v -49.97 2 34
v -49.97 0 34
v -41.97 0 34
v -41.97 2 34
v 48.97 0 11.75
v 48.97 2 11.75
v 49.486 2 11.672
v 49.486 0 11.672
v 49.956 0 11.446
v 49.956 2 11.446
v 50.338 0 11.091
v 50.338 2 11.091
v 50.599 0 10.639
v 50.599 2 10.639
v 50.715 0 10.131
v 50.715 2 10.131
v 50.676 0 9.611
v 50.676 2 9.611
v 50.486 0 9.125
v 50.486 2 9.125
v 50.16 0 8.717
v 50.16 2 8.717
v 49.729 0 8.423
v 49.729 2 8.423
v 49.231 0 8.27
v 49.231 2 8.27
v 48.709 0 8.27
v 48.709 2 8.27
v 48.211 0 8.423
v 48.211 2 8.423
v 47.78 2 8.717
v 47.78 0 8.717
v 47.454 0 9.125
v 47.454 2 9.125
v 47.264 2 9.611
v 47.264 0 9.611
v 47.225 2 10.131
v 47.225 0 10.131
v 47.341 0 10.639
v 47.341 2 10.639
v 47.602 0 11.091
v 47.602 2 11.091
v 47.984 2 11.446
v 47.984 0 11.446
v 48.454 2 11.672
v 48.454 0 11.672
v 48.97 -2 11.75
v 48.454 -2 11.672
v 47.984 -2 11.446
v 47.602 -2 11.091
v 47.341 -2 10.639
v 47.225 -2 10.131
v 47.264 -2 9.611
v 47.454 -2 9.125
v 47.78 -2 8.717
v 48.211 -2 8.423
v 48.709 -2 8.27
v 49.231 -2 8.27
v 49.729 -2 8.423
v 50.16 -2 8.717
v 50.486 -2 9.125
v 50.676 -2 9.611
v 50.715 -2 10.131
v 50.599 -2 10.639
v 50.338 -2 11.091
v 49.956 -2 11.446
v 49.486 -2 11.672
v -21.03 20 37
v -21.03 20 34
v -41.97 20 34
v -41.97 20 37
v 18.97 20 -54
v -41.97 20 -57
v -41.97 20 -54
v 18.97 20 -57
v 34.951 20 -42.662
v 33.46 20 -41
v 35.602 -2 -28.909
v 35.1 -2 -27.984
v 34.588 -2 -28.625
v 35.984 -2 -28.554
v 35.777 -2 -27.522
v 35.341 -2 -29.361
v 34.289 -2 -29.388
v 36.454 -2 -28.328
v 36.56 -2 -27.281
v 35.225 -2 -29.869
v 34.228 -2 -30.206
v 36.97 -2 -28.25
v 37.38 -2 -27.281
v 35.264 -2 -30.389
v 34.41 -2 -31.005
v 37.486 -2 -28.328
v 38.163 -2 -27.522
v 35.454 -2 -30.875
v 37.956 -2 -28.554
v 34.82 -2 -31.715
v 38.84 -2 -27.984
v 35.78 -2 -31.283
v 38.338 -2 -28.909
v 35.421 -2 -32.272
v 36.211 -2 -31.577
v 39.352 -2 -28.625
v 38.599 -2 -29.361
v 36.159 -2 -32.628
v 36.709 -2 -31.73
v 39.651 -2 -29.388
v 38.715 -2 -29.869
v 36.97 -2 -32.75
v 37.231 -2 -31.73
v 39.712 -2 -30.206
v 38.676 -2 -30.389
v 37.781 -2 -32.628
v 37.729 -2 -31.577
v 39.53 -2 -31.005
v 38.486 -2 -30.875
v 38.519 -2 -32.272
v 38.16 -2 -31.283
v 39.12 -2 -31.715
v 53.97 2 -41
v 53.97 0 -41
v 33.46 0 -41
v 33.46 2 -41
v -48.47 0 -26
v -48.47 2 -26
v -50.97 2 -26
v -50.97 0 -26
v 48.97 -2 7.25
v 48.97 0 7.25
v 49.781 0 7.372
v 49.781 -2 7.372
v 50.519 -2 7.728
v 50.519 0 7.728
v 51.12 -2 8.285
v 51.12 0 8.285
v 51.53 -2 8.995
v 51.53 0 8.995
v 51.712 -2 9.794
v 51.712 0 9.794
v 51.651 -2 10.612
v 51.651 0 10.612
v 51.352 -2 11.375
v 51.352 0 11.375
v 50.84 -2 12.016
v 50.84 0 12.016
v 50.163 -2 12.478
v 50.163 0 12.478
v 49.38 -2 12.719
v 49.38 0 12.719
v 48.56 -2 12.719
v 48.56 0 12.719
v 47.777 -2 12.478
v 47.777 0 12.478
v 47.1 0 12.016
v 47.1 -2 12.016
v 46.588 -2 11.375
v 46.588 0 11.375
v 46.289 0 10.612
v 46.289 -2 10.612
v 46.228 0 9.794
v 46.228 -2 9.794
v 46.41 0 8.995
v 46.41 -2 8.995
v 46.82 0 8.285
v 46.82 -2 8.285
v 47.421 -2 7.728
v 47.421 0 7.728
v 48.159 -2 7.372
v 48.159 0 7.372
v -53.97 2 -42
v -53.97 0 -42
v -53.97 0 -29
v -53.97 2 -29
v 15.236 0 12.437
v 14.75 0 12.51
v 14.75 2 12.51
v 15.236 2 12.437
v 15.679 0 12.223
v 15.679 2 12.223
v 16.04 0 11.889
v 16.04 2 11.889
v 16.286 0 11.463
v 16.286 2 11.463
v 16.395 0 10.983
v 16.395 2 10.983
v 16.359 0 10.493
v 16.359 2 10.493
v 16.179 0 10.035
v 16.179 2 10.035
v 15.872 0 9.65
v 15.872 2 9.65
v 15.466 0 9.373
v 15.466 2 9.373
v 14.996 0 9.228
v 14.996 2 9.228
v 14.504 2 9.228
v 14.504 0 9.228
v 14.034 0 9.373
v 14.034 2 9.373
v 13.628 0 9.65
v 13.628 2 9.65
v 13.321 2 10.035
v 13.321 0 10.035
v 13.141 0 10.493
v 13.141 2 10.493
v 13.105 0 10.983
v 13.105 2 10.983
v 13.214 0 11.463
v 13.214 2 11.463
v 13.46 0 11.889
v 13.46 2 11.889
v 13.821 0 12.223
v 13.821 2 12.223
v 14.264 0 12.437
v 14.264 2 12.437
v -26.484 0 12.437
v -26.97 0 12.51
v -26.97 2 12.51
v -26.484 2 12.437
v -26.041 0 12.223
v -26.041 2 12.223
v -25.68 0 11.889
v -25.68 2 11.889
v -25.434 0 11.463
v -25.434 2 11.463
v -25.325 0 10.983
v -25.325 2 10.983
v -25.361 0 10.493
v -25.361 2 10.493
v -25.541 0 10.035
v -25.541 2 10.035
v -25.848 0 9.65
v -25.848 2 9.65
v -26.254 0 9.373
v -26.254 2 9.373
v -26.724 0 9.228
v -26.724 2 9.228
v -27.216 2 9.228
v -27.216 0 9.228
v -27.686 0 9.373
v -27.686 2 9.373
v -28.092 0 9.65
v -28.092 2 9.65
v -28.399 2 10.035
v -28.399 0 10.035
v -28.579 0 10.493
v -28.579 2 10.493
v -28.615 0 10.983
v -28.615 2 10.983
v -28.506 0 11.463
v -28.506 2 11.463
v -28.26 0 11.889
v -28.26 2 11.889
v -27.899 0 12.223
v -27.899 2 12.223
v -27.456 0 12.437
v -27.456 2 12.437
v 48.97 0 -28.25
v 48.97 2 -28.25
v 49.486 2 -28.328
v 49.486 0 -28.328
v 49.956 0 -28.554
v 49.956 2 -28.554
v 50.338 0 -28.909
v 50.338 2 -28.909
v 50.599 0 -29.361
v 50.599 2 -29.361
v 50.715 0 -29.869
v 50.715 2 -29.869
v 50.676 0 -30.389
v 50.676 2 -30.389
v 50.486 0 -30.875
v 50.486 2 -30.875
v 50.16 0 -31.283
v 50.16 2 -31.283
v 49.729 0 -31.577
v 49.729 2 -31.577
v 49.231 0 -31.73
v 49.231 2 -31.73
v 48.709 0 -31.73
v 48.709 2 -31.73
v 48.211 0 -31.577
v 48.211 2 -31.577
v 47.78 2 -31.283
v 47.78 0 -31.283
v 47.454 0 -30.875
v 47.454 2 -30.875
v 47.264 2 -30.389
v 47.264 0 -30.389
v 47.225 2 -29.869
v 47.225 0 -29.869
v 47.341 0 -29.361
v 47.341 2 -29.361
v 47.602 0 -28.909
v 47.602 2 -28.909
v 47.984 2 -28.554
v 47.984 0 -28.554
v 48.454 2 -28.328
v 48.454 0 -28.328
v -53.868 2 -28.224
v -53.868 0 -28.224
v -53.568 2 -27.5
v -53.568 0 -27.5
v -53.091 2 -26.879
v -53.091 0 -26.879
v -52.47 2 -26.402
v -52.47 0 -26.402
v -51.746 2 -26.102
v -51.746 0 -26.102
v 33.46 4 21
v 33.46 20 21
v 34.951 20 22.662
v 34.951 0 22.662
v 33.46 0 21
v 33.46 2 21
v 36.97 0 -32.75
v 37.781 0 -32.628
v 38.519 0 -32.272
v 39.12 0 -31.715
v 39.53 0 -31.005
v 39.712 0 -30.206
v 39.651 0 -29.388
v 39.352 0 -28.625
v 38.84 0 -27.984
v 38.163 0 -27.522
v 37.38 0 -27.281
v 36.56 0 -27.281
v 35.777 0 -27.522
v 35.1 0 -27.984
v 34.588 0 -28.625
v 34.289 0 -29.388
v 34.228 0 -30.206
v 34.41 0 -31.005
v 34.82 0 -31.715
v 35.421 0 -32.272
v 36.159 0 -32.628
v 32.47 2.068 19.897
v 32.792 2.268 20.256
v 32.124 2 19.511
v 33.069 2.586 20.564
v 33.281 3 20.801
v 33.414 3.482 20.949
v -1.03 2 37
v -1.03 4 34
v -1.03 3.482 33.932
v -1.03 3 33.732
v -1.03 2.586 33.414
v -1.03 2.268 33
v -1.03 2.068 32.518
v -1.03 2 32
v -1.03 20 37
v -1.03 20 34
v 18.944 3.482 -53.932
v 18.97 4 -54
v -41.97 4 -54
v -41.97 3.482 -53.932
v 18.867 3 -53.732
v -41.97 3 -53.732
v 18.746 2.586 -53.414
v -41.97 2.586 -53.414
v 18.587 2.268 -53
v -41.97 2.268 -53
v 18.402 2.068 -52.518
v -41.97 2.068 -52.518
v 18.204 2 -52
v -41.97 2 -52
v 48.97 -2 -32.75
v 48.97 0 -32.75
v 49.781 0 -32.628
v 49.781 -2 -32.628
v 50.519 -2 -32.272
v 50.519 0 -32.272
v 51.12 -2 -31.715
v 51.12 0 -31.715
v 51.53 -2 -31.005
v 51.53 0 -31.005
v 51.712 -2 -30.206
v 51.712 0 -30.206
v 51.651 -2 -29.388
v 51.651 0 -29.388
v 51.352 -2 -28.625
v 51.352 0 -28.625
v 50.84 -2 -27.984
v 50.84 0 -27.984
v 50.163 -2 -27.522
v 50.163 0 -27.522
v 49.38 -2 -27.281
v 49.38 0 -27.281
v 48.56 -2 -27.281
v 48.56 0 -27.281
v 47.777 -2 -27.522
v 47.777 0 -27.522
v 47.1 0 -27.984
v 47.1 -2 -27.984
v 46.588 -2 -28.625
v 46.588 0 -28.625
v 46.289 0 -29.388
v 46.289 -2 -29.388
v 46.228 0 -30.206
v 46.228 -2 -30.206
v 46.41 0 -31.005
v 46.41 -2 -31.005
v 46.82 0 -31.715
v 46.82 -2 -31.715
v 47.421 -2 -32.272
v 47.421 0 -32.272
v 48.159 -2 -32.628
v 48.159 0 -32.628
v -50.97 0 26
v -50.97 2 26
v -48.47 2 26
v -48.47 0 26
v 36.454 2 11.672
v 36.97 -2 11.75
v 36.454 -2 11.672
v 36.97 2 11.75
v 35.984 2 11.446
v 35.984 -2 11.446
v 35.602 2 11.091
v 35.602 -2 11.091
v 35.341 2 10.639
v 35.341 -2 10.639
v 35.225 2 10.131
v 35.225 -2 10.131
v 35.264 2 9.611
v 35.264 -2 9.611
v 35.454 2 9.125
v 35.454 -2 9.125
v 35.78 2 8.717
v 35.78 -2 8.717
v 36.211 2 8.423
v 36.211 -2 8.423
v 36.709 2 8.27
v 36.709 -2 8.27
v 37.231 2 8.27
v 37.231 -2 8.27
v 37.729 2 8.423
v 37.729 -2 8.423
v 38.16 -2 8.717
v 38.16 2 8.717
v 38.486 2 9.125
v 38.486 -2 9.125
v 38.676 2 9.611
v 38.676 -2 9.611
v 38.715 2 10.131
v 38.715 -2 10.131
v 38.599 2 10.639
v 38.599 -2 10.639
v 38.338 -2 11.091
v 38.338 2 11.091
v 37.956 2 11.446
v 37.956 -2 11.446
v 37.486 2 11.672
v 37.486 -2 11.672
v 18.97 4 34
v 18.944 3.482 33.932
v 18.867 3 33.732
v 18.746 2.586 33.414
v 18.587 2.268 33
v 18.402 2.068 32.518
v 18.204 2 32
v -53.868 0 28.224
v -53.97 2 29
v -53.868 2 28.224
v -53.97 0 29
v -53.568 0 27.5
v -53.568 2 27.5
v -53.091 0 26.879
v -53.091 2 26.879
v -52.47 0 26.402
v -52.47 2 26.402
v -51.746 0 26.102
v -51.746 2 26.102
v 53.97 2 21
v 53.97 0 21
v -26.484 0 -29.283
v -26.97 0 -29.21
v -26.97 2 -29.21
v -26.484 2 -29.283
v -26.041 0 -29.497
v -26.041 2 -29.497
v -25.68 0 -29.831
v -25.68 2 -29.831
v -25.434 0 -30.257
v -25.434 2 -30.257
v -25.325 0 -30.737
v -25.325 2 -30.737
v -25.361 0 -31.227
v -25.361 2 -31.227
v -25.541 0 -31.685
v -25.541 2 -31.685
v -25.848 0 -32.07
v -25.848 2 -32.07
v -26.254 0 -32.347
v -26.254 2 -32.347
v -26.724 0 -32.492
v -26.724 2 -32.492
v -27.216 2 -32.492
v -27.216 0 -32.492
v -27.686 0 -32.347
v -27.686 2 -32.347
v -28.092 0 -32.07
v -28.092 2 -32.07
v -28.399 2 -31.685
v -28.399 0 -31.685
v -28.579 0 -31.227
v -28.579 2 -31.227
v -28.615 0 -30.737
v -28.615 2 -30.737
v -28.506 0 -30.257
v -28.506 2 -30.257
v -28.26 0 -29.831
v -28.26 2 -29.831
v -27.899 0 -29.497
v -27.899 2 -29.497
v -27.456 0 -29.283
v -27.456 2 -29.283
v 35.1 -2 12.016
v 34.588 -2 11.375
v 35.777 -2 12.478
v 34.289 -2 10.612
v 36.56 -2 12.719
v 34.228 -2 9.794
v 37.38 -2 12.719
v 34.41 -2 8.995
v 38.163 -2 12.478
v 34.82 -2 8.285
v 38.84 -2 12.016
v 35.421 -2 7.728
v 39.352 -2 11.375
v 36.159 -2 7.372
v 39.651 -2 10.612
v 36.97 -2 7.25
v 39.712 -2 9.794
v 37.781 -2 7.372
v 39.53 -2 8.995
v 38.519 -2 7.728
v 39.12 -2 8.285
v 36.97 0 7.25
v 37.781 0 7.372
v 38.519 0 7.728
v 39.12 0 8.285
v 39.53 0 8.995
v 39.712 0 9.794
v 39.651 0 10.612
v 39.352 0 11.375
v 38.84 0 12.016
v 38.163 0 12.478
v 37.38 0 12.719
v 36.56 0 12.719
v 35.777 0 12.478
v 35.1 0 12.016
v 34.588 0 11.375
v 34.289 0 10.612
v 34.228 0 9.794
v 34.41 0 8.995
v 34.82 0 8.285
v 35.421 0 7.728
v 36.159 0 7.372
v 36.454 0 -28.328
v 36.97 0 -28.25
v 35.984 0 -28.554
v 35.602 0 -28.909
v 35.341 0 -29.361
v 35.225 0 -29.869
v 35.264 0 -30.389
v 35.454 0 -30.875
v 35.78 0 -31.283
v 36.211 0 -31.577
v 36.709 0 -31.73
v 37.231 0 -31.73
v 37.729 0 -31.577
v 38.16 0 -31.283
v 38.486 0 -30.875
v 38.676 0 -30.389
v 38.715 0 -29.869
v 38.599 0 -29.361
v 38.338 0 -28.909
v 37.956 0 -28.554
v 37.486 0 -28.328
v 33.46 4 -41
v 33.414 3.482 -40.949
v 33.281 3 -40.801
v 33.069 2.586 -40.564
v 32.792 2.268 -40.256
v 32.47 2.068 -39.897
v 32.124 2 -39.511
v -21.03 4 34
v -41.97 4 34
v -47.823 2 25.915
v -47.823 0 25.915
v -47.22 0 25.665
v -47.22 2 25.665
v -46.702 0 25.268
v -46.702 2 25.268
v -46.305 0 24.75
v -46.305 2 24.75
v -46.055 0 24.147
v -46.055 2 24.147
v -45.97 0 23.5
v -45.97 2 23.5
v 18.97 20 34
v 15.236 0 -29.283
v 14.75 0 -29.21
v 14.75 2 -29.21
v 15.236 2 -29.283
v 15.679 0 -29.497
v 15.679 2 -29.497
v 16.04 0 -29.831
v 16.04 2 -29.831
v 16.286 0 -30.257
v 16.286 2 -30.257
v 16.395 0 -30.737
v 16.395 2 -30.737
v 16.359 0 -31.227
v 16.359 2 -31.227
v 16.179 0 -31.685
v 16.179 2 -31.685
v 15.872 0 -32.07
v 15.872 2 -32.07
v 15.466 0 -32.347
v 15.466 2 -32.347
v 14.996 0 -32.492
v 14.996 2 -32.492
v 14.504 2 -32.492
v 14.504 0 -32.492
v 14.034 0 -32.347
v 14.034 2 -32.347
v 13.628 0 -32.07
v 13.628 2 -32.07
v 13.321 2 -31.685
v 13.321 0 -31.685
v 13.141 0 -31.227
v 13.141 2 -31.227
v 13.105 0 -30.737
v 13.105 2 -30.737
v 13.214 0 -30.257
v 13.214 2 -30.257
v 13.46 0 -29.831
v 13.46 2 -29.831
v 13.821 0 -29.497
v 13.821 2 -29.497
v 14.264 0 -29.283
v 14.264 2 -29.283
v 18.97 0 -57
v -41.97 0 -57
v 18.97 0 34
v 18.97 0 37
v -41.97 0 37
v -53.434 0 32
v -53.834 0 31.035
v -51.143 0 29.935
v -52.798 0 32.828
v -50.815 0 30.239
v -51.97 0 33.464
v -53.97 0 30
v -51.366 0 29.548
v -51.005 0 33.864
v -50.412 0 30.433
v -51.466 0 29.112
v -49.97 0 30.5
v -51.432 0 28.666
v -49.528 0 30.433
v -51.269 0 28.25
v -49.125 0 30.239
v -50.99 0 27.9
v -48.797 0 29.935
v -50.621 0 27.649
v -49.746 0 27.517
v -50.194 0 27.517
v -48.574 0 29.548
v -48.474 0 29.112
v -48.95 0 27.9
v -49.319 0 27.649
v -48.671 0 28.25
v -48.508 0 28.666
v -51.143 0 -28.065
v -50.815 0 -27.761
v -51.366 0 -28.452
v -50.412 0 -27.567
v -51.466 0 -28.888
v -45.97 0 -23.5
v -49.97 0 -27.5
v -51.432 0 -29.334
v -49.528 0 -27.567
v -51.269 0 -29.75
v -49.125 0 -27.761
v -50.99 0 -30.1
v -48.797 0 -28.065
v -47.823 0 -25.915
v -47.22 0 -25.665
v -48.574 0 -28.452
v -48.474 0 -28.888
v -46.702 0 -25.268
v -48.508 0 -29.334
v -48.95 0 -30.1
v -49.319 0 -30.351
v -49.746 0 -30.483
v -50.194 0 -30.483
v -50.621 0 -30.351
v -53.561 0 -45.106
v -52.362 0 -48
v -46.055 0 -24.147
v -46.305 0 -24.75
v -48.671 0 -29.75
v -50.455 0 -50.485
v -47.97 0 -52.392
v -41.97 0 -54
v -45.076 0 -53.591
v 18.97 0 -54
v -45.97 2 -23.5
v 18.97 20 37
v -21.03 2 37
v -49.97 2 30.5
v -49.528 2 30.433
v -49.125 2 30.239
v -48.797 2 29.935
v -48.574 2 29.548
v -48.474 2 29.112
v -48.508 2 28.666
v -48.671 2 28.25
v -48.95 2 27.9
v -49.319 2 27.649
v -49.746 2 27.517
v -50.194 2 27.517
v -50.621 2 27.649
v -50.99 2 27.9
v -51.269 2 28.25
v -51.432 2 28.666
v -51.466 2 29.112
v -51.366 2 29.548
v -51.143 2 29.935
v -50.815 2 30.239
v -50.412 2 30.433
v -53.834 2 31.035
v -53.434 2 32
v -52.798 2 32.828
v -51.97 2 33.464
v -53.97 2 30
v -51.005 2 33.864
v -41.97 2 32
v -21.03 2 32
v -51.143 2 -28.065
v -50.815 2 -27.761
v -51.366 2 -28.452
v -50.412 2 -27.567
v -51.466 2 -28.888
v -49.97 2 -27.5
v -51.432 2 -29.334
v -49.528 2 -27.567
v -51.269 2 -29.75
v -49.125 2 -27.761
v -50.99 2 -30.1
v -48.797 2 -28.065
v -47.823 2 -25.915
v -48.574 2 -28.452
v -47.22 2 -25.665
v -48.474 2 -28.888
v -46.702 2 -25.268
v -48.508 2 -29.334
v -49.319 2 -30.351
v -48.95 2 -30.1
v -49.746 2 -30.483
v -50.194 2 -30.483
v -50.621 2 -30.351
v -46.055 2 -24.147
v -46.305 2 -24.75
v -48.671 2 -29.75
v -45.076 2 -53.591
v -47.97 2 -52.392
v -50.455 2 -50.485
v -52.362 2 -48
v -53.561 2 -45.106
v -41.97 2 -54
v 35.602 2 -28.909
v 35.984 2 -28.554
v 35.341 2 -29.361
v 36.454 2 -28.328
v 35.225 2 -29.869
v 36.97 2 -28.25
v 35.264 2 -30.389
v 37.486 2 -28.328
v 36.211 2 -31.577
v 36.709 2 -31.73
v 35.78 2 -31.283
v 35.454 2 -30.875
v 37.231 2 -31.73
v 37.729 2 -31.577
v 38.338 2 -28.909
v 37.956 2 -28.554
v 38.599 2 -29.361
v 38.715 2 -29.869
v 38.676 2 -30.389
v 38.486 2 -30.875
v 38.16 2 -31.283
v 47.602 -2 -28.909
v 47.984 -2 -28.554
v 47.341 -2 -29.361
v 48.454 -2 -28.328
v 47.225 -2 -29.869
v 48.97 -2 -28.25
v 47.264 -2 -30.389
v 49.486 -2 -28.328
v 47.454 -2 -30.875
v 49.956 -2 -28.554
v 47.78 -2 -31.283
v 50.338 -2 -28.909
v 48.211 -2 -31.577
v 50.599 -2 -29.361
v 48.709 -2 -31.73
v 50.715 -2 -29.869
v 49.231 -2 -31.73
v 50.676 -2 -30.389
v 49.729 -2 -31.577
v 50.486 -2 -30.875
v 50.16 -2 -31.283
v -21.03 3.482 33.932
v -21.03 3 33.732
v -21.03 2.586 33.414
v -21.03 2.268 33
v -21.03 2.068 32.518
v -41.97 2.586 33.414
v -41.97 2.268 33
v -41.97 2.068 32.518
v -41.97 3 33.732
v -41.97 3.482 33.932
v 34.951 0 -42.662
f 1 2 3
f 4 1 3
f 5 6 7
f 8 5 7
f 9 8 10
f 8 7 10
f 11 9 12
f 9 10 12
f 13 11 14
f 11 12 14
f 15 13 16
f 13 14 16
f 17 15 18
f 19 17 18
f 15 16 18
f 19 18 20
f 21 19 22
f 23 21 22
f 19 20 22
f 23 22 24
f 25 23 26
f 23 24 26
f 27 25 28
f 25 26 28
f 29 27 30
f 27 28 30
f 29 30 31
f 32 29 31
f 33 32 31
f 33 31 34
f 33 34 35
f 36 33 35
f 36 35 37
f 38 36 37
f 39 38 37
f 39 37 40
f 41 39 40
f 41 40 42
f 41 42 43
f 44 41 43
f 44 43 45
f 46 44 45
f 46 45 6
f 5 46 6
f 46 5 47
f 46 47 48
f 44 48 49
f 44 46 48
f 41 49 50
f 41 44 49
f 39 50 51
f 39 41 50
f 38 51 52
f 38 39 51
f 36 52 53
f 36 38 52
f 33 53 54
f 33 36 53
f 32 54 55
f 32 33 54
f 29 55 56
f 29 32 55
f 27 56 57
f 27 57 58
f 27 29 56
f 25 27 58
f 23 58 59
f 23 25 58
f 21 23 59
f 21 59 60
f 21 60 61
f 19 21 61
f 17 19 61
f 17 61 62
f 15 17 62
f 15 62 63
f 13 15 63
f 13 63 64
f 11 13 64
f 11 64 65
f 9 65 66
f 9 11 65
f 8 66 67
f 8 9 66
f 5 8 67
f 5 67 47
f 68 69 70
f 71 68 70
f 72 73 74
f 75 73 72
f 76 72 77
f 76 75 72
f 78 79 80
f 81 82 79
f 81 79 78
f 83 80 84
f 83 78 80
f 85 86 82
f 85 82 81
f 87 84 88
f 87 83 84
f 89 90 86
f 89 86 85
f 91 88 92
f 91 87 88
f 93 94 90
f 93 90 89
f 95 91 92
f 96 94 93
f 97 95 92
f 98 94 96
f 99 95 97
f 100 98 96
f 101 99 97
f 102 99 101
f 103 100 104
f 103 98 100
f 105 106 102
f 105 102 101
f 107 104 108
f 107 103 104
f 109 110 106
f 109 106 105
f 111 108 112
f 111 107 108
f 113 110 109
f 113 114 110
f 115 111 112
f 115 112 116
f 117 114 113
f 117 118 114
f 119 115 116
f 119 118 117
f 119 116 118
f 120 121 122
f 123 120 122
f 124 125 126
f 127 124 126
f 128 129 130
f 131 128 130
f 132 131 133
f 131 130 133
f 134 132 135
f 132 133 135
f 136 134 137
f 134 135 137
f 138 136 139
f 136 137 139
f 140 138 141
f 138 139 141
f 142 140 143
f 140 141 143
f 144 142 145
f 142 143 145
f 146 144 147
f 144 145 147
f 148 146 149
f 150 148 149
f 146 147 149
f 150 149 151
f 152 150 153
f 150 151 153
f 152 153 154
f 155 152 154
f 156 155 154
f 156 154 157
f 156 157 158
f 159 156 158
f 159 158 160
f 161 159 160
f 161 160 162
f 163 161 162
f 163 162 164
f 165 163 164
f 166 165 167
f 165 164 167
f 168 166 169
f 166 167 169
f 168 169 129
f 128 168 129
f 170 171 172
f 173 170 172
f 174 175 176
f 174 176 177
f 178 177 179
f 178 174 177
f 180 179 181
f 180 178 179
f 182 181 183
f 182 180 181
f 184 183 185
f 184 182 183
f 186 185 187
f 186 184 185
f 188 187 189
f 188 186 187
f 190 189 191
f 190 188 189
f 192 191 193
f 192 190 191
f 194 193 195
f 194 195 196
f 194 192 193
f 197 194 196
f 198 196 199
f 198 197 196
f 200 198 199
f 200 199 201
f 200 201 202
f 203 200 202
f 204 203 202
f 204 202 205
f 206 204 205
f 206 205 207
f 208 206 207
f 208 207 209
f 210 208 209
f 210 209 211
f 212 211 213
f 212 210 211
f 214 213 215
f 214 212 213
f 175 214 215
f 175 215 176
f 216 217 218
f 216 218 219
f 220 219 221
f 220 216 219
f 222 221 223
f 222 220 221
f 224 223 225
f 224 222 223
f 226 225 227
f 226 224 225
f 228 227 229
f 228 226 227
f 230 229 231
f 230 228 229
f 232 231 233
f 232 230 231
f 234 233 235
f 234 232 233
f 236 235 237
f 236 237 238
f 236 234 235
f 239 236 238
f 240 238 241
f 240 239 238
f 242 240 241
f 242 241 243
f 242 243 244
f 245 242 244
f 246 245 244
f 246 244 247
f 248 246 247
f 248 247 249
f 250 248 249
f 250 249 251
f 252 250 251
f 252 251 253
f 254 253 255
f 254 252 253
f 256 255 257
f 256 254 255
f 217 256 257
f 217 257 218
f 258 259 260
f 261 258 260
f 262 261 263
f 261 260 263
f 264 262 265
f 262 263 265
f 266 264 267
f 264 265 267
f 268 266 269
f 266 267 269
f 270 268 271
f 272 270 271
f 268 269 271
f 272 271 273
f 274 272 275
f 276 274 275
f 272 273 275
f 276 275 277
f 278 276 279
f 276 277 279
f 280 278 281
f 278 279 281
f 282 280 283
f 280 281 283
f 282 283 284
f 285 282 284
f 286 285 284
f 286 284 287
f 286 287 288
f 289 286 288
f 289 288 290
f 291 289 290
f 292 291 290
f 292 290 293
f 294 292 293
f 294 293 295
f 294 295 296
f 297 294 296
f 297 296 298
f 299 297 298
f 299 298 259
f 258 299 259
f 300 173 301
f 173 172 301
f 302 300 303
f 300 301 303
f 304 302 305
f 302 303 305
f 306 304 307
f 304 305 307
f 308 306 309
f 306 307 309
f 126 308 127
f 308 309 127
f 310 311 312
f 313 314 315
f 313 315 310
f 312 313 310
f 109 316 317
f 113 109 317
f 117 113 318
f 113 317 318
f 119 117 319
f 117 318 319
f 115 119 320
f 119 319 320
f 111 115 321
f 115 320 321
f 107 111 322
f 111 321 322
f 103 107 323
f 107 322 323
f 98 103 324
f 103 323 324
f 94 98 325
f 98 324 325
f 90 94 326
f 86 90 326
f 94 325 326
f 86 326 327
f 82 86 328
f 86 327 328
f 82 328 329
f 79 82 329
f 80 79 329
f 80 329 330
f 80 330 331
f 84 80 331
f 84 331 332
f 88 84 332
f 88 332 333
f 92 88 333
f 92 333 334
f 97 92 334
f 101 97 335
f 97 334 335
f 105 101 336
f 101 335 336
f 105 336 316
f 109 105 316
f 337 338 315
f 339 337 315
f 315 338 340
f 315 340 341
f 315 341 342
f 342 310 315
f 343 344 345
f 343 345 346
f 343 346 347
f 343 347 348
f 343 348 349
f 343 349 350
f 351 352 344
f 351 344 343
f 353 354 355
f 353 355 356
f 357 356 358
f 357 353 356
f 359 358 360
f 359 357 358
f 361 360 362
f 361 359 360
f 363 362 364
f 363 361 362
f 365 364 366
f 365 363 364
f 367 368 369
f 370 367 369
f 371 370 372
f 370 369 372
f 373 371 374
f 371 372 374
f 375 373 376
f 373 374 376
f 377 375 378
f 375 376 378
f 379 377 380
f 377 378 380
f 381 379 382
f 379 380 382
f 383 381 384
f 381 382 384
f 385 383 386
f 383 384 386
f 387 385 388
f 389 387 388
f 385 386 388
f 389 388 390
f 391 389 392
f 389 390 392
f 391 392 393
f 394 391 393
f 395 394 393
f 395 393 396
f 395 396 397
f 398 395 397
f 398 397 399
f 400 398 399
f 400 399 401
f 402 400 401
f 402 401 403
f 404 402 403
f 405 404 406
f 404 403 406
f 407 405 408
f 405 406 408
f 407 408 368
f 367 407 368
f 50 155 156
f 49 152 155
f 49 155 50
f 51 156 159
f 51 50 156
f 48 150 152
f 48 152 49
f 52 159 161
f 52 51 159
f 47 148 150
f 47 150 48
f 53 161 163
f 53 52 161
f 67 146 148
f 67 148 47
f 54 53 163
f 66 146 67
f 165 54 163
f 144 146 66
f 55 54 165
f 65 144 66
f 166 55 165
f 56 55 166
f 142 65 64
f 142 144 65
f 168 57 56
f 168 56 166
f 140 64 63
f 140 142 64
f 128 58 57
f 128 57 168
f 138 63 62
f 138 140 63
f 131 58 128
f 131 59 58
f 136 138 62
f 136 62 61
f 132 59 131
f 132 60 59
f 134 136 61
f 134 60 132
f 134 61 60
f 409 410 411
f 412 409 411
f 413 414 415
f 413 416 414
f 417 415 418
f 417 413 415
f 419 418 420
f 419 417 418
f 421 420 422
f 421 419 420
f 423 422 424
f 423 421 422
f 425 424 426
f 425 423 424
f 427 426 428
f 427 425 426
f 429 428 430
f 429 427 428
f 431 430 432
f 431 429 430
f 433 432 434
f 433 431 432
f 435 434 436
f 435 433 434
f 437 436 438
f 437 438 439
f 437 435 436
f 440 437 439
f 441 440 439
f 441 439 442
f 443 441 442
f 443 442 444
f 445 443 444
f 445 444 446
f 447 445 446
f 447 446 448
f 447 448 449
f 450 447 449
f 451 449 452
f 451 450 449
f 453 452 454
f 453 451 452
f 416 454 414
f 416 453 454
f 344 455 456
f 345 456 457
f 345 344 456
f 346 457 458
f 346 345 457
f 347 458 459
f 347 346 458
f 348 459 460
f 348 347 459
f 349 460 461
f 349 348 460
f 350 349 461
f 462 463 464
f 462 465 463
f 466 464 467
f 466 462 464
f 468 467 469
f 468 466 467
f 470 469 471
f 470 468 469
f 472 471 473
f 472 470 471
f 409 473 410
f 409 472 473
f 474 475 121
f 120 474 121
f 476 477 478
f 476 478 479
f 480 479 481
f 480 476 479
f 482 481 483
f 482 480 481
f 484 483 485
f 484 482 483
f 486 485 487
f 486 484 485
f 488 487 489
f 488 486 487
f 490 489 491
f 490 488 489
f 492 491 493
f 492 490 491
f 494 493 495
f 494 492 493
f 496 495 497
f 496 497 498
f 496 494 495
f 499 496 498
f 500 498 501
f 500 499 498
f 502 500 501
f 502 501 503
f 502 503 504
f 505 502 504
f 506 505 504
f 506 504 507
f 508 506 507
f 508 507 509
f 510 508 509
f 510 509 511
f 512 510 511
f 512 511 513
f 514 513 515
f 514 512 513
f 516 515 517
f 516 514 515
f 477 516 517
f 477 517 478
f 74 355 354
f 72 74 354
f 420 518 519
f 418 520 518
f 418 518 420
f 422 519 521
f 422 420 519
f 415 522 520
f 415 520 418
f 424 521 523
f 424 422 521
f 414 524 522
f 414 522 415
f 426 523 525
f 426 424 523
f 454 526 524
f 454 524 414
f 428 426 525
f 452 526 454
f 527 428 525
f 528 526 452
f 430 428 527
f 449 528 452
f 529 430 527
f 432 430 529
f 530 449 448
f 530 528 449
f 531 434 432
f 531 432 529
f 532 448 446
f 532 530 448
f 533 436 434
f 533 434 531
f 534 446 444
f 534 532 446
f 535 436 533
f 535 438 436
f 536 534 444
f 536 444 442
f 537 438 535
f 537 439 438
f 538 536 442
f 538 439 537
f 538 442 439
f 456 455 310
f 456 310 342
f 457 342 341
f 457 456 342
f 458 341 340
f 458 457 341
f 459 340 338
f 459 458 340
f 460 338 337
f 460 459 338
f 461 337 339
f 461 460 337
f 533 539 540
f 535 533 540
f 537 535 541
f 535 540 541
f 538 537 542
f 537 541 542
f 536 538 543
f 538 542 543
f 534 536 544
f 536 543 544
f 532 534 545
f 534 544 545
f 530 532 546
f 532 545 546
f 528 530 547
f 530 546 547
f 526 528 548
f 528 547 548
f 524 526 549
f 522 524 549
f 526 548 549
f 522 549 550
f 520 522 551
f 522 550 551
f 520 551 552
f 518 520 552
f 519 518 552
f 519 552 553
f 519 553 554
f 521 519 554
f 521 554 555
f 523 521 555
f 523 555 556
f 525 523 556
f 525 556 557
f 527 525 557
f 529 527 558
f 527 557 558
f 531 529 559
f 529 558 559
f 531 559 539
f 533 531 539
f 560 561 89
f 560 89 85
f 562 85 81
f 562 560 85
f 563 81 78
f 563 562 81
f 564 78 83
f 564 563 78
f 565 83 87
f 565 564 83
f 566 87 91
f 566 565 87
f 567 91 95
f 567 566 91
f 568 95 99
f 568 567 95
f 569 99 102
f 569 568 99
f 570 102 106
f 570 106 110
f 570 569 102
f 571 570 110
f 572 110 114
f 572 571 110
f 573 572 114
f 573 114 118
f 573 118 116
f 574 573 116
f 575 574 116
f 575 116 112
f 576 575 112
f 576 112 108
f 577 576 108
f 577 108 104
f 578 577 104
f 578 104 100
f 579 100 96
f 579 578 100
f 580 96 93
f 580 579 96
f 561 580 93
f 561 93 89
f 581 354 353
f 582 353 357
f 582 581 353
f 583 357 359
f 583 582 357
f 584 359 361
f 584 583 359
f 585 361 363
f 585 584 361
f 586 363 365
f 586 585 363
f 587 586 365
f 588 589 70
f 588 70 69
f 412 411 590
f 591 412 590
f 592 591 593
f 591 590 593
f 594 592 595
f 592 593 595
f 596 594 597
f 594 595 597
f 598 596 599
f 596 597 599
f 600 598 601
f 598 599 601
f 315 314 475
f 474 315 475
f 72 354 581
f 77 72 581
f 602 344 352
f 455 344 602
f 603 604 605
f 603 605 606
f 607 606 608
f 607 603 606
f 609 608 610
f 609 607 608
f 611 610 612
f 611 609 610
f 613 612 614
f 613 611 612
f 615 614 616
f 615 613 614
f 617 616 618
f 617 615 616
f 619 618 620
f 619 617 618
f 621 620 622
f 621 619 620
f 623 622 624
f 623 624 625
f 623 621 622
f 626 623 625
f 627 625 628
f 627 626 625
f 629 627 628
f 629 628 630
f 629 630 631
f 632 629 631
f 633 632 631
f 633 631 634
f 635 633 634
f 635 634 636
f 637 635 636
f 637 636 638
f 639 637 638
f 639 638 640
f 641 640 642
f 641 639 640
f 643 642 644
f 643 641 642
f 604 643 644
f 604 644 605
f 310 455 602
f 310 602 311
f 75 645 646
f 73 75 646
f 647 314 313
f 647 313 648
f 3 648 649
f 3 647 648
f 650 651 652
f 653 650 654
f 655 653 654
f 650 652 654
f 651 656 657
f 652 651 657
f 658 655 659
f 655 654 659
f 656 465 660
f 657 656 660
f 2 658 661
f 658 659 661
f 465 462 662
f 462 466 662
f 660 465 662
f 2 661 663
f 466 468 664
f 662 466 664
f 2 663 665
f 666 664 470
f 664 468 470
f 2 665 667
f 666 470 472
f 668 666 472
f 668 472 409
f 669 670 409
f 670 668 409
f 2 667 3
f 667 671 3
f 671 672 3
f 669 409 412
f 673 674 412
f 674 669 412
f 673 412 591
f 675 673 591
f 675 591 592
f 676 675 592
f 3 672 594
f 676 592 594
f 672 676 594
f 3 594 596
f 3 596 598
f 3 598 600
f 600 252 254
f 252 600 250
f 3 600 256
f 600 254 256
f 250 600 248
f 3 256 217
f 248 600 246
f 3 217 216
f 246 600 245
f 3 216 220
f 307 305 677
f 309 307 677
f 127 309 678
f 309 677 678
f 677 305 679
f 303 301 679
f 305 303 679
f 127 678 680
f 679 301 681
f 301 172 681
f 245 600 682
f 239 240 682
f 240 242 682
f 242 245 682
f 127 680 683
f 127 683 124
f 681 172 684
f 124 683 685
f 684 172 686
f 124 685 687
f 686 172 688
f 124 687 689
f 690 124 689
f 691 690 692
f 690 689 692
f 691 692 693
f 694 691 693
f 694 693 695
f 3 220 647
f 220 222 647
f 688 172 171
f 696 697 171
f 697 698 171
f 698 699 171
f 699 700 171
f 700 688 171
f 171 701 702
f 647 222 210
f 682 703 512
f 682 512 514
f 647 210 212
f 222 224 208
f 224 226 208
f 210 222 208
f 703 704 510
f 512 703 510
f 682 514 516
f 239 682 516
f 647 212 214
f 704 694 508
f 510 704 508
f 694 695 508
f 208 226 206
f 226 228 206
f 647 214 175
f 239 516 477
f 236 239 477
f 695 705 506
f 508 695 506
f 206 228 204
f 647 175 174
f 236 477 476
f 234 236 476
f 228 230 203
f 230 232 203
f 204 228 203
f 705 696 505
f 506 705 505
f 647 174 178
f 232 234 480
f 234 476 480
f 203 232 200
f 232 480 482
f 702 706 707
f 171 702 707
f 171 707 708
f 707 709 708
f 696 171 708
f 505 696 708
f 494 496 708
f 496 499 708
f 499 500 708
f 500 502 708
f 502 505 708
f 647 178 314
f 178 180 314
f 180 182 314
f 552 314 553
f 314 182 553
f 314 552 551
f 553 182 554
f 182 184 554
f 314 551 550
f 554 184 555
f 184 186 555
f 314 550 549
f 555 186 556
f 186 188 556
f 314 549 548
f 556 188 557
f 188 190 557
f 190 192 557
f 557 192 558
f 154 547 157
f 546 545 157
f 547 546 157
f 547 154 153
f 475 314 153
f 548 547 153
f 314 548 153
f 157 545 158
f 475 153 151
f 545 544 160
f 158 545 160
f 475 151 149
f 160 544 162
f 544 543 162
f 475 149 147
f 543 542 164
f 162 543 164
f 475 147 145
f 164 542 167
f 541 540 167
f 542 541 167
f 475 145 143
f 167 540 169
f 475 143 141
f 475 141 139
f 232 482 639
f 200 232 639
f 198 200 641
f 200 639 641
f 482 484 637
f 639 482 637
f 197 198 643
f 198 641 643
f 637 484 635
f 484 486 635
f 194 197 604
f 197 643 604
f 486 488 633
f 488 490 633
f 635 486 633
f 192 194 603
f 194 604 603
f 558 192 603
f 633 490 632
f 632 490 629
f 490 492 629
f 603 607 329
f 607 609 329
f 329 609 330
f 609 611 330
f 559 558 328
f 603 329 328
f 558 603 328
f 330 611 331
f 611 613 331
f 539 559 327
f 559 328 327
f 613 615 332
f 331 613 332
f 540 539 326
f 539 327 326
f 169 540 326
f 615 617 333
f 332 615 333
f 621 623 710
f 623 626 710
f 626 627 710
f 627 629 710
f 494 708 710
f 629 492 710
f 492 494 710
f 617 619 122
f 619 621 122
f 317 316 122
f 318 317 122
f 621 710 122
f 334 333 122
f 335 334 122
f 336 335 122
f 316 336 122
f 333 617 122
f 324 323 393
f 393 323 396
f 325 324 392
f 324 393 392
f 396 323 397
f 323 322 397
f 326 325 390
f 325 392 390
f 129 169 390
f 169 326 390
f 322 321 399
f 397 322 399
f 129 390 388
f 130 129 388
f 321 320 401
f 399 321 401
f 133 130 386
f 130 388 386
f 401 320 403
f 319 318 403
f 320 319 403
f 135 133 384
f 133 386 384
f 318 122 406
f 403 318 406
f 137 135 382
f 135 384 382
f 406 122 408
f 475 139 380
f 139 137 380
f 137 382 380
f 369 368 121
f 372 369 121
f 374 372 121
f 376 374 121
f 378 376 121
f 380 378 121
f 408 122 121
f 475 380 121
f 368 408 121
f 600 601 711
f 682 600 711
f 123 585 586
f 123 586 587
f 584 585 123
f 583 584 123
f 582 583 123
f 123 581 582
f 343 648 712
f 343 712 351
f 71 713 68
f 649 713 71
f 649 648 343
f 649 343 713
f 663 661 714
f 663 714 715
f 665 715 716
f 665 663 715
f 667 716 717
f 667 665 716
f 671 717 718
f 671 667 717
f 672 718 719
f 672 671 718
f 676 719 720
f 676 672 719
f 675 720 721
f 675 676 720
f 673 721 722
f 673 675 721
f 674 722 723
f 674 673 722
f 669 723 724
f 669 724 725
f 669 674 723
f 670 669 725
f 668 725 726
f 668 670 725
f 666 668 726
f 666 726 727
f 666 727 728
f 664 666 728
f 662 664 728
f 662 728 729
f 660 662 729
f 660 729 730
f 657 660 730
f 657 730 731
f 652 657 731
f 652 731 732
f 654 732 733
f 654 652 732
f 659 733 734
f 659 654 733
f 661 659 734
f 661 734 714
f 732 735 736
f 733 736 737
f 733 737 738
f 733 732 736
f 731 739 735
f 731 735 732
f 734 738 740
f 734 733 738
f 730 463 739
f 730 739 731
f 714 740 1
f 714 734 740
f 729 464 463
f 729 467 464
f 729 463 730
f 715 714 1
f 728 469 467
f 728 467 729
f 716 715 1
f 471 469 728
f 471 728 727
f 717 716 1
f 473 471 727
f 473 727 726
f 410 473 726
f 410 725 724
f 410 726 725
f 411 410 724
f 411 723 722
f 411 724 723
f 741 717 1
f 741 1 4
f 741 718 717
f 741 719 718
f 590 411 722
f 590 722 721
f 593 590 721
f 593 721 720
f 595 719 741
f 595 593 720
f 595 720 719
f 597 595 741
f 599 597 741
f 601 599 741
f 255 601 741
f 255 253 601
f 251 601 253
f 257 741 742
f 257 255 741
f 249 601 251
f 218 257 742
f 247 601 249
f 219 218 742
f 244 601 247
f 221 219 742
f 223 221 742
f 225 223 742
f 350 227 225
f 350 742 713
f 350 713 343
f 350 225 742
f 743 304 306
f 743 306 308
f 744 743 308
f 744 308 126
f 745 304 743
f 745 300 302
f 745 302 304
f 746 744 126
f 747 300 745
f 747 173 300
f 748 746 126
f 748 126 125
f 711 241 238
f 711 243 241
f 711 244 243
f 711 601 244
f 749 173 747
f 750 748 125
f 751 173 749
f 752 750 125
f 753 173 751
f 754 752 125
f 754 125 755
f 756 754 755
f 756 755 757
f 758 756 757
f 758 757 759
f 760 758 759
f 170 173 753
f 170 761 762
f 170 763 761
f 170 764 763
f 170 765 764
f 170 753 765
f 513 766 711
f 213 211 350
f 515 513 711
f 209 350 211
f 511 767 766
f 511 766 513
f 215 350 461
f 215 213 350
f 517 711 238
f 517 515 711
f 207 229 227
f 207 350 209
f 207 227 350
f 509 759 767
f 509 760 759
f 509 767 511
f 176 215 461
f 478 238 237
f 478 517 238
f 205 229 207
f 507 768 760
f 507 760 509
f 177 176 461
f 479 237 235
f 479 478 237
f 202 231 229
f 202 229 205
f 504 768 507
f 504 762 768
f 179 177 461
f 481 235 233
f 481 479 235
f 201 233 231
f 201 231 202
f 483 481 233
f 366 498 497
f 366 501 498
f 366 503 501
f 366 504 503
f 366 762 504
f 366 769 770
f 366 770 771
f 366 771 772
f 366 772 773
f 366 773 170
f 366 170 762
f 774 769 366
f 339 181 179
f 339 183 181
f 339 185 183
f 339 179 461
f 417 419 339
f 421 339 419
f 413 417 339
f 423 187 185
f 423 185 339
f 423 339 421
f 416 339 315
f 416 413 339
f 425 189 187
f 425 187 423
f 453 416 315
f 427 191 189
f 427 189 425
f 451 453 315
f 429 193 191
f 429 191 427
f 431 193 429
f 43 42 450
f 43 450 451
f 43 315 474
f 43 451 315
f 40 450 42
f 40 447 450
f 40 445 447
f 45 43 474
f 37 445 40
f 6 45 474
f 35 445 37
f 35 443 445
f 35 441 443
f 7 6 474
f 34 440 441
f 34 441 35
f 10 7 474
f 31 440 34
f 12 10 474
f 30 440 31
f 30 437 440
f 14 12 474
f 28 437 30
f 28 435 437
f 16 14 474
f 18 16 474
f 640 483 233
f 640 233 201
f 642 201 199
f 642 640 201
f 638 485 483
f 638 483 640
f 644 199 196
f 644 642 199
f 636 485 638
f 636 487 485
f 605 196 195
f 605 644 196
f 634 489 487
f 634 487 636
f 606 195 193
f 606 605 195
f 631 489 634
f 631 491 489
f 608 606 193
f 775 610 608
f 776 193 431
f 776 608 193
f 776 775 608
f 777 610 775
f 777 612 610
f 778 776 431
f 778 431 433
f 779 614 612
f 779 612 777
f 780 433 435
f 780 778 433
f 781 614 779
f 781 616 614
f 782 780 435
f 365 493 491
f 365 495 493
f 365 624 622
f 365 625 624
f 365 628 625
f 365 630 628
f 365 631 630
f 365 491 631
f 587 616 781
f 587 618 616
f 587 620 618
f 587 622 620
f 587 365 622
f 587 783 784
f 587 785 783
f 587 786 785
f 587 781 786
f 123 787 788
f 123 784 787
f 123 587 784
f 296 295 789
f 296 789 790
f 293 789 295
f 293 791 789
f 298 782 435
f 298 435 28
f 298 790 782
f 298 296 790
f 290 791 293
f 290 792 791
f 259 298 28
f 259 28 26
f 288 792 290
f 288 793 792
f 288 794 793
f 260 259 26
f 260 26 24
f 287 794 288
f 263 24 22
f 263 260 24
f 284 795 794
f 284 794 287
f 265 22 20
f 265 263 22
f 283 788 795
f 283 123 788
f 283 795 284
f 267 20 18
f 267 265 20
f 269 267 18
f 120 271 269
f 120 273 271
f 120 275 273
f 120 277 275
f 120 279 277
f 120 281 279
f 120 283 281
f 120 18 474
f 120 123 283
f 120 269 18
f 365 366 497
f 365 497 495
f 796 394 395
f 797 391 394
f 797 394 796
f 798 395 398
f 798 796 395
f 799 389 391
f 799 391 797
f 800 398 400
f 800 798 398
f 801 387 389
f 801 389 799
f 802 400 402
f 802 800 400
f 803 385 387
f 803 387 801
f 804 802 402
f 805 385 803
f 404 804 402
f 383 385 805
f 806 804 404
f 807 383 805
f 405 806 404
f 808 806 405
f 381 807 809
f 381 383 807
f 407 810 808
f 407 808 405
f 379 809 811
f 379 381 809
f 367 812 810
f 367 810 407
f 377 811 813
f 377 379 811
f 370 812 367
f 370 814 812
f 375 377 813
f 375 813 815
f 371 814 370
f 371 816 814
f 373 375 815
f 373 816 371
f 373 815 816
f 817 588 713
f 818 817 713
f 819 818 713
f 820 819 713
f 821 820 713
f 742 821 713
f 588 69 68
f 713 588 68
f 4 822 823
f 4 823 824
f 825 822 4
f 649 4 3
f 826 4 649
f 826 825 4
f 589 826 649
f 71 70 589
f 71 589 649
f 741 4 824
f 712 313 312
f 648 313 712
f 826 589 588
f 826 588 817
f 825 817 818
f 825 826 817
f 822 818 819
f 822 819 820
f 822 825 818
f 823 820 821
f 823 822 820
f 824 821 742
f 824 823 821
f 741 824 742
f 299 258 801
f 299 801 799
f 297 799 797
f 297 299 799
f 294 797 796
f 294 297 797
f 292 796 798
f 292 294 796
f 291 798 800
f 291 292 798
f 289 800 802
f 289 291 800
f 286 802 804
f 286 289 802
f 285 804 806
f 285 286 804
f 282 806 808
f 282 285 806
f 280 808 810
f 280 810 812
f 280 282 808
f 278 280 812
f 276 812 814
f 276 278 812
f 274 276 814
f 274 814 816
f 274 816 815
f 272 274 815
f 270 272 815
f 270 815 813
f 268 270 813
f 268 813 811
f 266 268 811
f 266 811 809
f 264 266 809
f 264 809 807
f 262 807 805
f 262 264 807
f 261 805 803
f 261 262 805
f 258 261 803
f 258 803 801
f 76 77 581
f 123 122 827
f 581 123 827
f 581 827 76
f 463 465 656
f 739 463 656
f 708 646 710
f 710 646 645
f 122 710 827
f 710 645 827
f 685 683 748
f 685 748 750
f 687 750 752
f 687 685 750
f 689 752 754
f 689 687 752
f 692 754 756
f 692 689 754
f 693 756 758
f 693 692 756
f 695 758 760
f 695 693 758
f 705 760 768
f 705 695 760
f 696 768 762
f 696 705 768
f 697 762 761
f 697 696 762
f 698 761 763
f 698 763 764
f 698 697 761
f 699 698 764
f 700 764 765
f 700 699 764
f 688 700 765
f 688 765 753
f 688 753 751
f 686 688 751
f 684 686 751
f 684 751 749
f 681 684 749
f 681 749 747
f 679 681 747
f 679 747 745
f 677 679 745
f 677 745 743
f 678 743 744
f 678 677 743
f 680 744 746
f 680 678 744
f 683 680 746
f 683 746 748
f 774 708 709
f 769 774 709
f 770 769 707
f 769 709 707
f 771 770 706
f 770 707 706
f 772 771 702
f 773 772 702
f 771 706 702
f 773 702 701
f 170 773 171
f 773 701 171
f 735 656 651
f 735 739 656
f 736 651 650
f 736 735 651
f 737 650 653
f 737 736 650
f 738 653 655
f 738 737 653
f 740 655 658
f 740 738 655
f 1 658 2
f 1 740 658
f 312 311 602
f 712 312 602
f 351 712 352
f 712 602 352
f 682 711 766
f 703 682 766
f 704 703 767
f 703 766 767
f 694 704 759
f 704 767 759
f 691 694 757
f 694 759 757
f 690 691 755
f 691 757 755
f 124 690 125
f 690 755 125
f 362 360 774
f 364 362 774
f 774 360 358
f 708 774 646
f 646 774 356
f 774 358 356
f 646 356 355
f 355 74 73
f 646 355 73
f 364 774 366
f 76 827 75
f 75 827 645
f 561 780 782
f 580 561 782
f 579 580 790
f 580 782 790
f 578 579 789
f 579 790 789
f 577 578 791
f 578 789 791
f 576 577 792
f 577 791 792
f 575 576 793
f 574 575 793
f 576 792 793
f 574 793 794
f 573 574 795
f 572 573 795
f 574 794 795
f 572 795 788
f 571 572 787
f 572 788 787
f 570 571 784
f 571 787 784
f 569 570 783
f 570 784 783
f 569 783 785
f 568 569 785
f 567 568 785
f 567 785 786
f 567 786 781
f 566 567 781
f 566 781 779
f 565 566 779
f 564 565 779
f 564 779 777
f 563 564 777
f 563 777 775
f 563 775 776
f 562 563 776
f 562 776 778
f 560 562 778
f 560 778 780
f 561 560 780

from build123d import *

# Parameters (mm, degrees)
CROQUIS1_R              = 1.5
CROQUIS1_R_2            = 1.65
SALIENTE_EXTRUIR1_DEPTH = 2
REDONDEO1_R             = 4
CORTAR_EXTRUIR1_DEPTH   = 77.372514035
REDONDEO2_R             = 3
CROQUIS5_R              = 1.75
CORTAR_EXTRUIR2_DEPTH   = 77.372514035
CROQUIS6_R              = 2.75
CROQUIS6_R_2            = 1.75
SALIENTE_EXTRUIR6_DEPTH = 2
SALIENTE_EXTRUIR7_DEPTH = 20
CORTAR_EXTRUIR3_REACH   = 112.221
CROQUIS8_W              = 20
CROQUIS8_H              = 18
REDONDEO3_R             = 2


with BuildPart() as part:
    # Croquis1 → Saliente-Extruir1 (new body)
    with BuildSketch(Plane(origin=(0, 0, 0), x_dir=(1, 0, 0), z_dir=(0, 1, 0))):
        with BuildLine():
            Line((33.46, 41), (18.97, 54))
            Line((18.97, 54), (-41.97, 54))
            ThreePointArc((-41.97, 54), (-50.455281374, 50.485281374), (-53.97, 42))
            Line((-53.97, 42), (-53.97, -34))
            Line((-53.97, -34), (18.97, -34))
            Line((18.97, -34), (33.46, -21))
            Line((33.46, -21), (53.97, -21))
            Line((53.97, -21), (53.97, 7.59309581))
            Line((53.97, 7.59309581), (53.97, 12.40690419))
            Line((53.97, 12.40690419), (53.97, 41))
            Line((53.97, 41), (33.46, 41))
        make_face()
        with Locations(Location((-49.97, -29, 0), (0, 0, 270))):
            Circle(CROQUIS1_R, mode=Mode.SUBTRACT)
        with Locations(Location((-26.97, -10.86, 0), (0, 0, 270))):
            Circle(CROQUIS1_R_2, mode=Mode.SUBTRACT)
        with Locations(Location((14.75, -10.86, 0), (0, 0, 270))):
            Circle(CROQUIS1_R_2, mode=Mode.SUBTRACT)
        with Locations(Location((-49.97, 29, 0), (0, 0, 270))):
            Circle(CROQUIS1_R, mode=Mode.SUBTRACT)
        with Locations(Location((-26.97, 30.86, 0), (0, 0, 270))):
            Circle(CROQUIS1_R_2, mode=Mode.SUBTRACT)
        with Locations(Location((14.75, 30.86, 0), (0, 0, 270))):
            Circle(CROQUIS1_R_2, mode=Mode.SUBTRACT)
    extrude(amount=SALIENTE_EXTRUIR1_DEPTH)

    # Redondeo1
    redondeo1_edges = [part.edges().sort_by_distance(p)[0] for p in [
        (-53.97, 1, 34),
    ]]
    fillet(redondeo1_edges, radius=REDONDEO1_R)

    # Croquis4 → Cortar-Extruir1 (cut, through all)
    with BuildSketch(Plane(origin=(0, 2, 0), x_dir=(1, 0, 0), z_dir=(0, 1, 0))):
        with BuildLine():
            Line((-53.97, 26), (-53.97, -26))
            Line((-53.97, -26), (-48.47, -26))
            ThreePointArc((-48.47, -26), (-46.702233047, -25.267766953), (-45.97, -23.5))
            Line((-45.97, -23.5), (-45.97, 23.5))
            ThreePointArc((-45.97, 23.5), (-46.702233047, 25.267766953), (-48.47, 26))
            Line((-48.47, 26), (-53.97, 26))
        make_face()
    extrude(amount=-CORTAR_EXTRUIR1_DEPTH, mode=Mode.SUBTRACT)

    # Redondeo2
    redondeo2_edges = [part.edges().sort_by_distance(p)[0] for p in [
        (-53.97, 1, -26),
        (-53.97, 1, 26),
    ]]
    fillet(redondeo2_edges, radius=REDONDEO2_R)

    # Croquis5 → Cortar-Extruir2 (cut, through all)
    with BuildSketch(Plane(origin=(0, 2, 0), x_dir=(1, 0, 0), z_dir=(0, 1, 0))):
        with Locations(Location((36.97, 30, 0), (0, 0, 270))):
            Circle(CROQUIS5_R)
        with Locations(Location((36.97, -10, 0), (0, 0, 270))):
            Circle(CROQUIS5_R)
        with Locations(Location((48.97, 30, 0), (0, 0, 270))):
            Circle(CROQUIS5_R)
        with Locations(Location((48.97, -10, 0), (0, 0, 270))):
            Circle(CROQUIS5_R)
    extrude(amount=-CORTAR_EXTRUIR2_DEPTH, mode=Mode.SUBTRACT)

    # Croquis6 → Saliente-Extruir6 (add)
    # profile 1 of 4: a face of its own
    with BuildSketch(Plane.XZ):
        with Locations(Location((36.97, 10, 0), (0, 0, 270))):
            Circle(CROQUIS6_R)
        with Locations(Location((36.97, 10, 0), (0, 0, 90))):
            Circle(CROQUIS6_R_2, mode=Mode.SUBTRACT)
    # profile 2 of 4: a face of its own
    with BuildSketch(Plane.XZ):
        with Locations(Location((36.97, -30, 0), (0, 0, 270))):
            Circle(CROQUIS6_R)
        with Locations(Location((36.97, -30, 0), (0, 0, 90))):
            Circle(CROQUIS6_R_2, mode=Mode.SUBTRACT)
    # profile 3 of 4: a face of its own
    with BuildSketch(Plane.XZ):
        with Locations(Location((48.97, -30, 0), (0, 0, 270))):
            Circle(CROQUIS6_R)
        with Locations(Location((48.97, -30, 0), (0, 0, 90))):
            Circle(CROQUIS6_R_2, mode=Mode.SUBTRACT)
    # profile 4 of 4: a face of its own
    with BuildSketch(Plane.XZ):
        with Locations(Location((48.97, 10, 0), (0, 0, 270))):
            Circle(CROQUIS6_R)
        with Locations(Location((48.97, 10, 0), (0, 0, 90))):
            Circle(CROQUIS6_R_2, mode=Mode.SUBTRACT)
    extrude(amount=SALIENTE_EXTRUIR6_DEPTH)

    # Croquis7 → Saliente-Extruir7 (add)
    with BuildSketch(Plane(origin=(0, 0, 0), x_dir=(1, 0, 0), z_dir=(0, 1, 0))):
        Polygon((-41.97, -34), (18.97, -34), (33.46, -21), (34.951212399, -22.662128282), (18.97, -37), (-41.97, -37), align=None)
        Polygon((-41.97, 54), (18.97, 54), (33.46, 41), (34.951212399, 42.662128282), (18.97, 57), (-41.97, 57), align=None)
    extrude(amount=SALIENTE_EXTRUIR7_DEPTH)

    # Croquis8 → Cortar-Extruir3 (cut, up to next)
    with BuildSketch(Plane.XY.offset(37), mode=Mode.PRIVATE) as cortar_extruir3_sk1:
        with Locations((-11.03, 11)):
            Rectangle(CROQUIS8_W, CROQUIS8_H)
    cortar_extruir3_tool1 = extrude(cortar_extruir3_sk1.sketch, amount=-CORTAR_EXTRUIR3_REACH, mode=Mode.PRIVATE) & part.part
    add(cortar_extruir3_tool1.solids().sort_by_distance((-11.03, 11, 37))[0], mode=Mode.SUBTRACT)

    # Redondeo3
    # the kernel refuses this fillet: 2 mm, written as the material it adds along each edge
    with BuildSketch(Plane(origin=(-41.97, 2, 34), x_dir=(0, 0, -1), z_dir=(1, 0, 0))) as redondeo3_piece_1:
        with BuildLine():
            CenterArc((REDONDEO3_R, REDONDEO3_R), REDONDEO3_R, 180, 90)
            Line((0, REDONDEO3_R), (0, 0))
            Line((0, 0), (REDONDEO3_R, 0))
        make_face()
    extrude(amount=20.94)
    with BuildSketch(Plane(origin=(-1.03, 2, 34), x_dir=(0, 0, -1), z_dir=(1, 0, 0))) as redondeo3_piece_2_section:
        with BuildLine():
            CenterArc((REDONDEO3_R, REDONDEO3_R), REDONDEO3_R, 180, 90)
            Line((0, REDONDEO3_R), (0, 0))
            Line((0, 0), (REDONDEO3_R, 0))
        make_face()
    redondeo3_piece_2 = extrude(amount=25, mode=Mode.PRIVATE)
    redondeo3_piece_2 = split(redondeo3_piece_2, bisect_by=Plane(origin=(13.795733926, 2.442237096, 38.642198686), z_dir=(-0.6678002989650054, 0, -0.7443404870771505)), keep=Keep.TOP, mode=Mode.PRIVATE)
    add(redondeo3_piece_2)
    with BuildSketch(Plane(origin=(23.97, 2, -54), x_dir=(0, 0, 1), z_dir=(-1, 0, 0))) as redondeo3_piece_3_section:
        with BuildLine():
            CenterArc((REDONDEO3_R, REDONDEO3_R), REDONDEO3_R, 180, 90)
            Line((0, REDONDEO3_R), (0, 0))
            Line((0, 0), (REDONDEO3_R, 0))
        make_face()
    redondeo3_piece_3 = extrude(amount=65.94, mode=Mode.PRIVATE)
    redondeo3_piece_3 = split(redondeo3_piece_3, bisect_by=Plane(origin=(3.244998738, 2.450659897, -68.108006653), z_dir=(-0.6678002989650061, 0, 0.7443404870771497)), keep=Keep.TOP, mode=Mode.PRIVATE)
    add(redondeo3_piece_3)
    with BuildSketch(Plane(origin=(15.248297565, 2, 37.339001495), x_dir=(-0.6678002989650055, 0, -0.7443404870771503), z_dir=(0.7443404870771504, 0, -0.6678002989650055))) as redondeo3_piece_4_section:
        with BuildLine():
            CenterArc((REDONDEO3_R, REDONDEO3_R), REDONDEO3_R, 180, 90)
            Line((0, REDONDEO3_R), (0, 0))
            Line((0, 0), (REDONDEO3_R, 0))
        make_face()
    redondeo3_piece_4 = extrude(amount=24.466897544, mode=Mode.PRIVATE)
    redondeo3_piece_4 = split(redondeo3_piece_4, bisect_by=Plane(origin=(25.546033726, 2.446735878, 34), z_dir=(0, 0, -1)), keep=Keep.TOP, mode=Mode.PRIVATE)
    add(redondeo3_piece_4)
    with BuildSketch(Plane(origin=(33.46, 2, -41), x_dir=(-0.6678002989650058, 0, 0.74434048707715), z_dir=(-0.7443404870771501, 0, -0.6678002989650059))) as redondeo3_piece_5_section:
        with BuildLine():
            CenterArc((REDONDEO3_R, REDONDEO3_R), REDONDEO3_R, 180, 90)
            Line((0, REDONDEO3_R), (0, 0))
            Line((0, 0), (REDONDEO3_R, 0))
        make_face()
    redondeo3_piece_5 = extrude(amount=24.466897544, mode=Mode.PRIVATE)
    redondeo3_piece_5 = split(redondeo3_piece_5, bisect_by=Plane(origin=(32.635535298, 2.26154088, -54), z_dir=(0, 0, 1)), keep=Keep.TOP, mode=Mode.PRIVATE)
    add(redondeo3_piece_5)


solid = part.part
